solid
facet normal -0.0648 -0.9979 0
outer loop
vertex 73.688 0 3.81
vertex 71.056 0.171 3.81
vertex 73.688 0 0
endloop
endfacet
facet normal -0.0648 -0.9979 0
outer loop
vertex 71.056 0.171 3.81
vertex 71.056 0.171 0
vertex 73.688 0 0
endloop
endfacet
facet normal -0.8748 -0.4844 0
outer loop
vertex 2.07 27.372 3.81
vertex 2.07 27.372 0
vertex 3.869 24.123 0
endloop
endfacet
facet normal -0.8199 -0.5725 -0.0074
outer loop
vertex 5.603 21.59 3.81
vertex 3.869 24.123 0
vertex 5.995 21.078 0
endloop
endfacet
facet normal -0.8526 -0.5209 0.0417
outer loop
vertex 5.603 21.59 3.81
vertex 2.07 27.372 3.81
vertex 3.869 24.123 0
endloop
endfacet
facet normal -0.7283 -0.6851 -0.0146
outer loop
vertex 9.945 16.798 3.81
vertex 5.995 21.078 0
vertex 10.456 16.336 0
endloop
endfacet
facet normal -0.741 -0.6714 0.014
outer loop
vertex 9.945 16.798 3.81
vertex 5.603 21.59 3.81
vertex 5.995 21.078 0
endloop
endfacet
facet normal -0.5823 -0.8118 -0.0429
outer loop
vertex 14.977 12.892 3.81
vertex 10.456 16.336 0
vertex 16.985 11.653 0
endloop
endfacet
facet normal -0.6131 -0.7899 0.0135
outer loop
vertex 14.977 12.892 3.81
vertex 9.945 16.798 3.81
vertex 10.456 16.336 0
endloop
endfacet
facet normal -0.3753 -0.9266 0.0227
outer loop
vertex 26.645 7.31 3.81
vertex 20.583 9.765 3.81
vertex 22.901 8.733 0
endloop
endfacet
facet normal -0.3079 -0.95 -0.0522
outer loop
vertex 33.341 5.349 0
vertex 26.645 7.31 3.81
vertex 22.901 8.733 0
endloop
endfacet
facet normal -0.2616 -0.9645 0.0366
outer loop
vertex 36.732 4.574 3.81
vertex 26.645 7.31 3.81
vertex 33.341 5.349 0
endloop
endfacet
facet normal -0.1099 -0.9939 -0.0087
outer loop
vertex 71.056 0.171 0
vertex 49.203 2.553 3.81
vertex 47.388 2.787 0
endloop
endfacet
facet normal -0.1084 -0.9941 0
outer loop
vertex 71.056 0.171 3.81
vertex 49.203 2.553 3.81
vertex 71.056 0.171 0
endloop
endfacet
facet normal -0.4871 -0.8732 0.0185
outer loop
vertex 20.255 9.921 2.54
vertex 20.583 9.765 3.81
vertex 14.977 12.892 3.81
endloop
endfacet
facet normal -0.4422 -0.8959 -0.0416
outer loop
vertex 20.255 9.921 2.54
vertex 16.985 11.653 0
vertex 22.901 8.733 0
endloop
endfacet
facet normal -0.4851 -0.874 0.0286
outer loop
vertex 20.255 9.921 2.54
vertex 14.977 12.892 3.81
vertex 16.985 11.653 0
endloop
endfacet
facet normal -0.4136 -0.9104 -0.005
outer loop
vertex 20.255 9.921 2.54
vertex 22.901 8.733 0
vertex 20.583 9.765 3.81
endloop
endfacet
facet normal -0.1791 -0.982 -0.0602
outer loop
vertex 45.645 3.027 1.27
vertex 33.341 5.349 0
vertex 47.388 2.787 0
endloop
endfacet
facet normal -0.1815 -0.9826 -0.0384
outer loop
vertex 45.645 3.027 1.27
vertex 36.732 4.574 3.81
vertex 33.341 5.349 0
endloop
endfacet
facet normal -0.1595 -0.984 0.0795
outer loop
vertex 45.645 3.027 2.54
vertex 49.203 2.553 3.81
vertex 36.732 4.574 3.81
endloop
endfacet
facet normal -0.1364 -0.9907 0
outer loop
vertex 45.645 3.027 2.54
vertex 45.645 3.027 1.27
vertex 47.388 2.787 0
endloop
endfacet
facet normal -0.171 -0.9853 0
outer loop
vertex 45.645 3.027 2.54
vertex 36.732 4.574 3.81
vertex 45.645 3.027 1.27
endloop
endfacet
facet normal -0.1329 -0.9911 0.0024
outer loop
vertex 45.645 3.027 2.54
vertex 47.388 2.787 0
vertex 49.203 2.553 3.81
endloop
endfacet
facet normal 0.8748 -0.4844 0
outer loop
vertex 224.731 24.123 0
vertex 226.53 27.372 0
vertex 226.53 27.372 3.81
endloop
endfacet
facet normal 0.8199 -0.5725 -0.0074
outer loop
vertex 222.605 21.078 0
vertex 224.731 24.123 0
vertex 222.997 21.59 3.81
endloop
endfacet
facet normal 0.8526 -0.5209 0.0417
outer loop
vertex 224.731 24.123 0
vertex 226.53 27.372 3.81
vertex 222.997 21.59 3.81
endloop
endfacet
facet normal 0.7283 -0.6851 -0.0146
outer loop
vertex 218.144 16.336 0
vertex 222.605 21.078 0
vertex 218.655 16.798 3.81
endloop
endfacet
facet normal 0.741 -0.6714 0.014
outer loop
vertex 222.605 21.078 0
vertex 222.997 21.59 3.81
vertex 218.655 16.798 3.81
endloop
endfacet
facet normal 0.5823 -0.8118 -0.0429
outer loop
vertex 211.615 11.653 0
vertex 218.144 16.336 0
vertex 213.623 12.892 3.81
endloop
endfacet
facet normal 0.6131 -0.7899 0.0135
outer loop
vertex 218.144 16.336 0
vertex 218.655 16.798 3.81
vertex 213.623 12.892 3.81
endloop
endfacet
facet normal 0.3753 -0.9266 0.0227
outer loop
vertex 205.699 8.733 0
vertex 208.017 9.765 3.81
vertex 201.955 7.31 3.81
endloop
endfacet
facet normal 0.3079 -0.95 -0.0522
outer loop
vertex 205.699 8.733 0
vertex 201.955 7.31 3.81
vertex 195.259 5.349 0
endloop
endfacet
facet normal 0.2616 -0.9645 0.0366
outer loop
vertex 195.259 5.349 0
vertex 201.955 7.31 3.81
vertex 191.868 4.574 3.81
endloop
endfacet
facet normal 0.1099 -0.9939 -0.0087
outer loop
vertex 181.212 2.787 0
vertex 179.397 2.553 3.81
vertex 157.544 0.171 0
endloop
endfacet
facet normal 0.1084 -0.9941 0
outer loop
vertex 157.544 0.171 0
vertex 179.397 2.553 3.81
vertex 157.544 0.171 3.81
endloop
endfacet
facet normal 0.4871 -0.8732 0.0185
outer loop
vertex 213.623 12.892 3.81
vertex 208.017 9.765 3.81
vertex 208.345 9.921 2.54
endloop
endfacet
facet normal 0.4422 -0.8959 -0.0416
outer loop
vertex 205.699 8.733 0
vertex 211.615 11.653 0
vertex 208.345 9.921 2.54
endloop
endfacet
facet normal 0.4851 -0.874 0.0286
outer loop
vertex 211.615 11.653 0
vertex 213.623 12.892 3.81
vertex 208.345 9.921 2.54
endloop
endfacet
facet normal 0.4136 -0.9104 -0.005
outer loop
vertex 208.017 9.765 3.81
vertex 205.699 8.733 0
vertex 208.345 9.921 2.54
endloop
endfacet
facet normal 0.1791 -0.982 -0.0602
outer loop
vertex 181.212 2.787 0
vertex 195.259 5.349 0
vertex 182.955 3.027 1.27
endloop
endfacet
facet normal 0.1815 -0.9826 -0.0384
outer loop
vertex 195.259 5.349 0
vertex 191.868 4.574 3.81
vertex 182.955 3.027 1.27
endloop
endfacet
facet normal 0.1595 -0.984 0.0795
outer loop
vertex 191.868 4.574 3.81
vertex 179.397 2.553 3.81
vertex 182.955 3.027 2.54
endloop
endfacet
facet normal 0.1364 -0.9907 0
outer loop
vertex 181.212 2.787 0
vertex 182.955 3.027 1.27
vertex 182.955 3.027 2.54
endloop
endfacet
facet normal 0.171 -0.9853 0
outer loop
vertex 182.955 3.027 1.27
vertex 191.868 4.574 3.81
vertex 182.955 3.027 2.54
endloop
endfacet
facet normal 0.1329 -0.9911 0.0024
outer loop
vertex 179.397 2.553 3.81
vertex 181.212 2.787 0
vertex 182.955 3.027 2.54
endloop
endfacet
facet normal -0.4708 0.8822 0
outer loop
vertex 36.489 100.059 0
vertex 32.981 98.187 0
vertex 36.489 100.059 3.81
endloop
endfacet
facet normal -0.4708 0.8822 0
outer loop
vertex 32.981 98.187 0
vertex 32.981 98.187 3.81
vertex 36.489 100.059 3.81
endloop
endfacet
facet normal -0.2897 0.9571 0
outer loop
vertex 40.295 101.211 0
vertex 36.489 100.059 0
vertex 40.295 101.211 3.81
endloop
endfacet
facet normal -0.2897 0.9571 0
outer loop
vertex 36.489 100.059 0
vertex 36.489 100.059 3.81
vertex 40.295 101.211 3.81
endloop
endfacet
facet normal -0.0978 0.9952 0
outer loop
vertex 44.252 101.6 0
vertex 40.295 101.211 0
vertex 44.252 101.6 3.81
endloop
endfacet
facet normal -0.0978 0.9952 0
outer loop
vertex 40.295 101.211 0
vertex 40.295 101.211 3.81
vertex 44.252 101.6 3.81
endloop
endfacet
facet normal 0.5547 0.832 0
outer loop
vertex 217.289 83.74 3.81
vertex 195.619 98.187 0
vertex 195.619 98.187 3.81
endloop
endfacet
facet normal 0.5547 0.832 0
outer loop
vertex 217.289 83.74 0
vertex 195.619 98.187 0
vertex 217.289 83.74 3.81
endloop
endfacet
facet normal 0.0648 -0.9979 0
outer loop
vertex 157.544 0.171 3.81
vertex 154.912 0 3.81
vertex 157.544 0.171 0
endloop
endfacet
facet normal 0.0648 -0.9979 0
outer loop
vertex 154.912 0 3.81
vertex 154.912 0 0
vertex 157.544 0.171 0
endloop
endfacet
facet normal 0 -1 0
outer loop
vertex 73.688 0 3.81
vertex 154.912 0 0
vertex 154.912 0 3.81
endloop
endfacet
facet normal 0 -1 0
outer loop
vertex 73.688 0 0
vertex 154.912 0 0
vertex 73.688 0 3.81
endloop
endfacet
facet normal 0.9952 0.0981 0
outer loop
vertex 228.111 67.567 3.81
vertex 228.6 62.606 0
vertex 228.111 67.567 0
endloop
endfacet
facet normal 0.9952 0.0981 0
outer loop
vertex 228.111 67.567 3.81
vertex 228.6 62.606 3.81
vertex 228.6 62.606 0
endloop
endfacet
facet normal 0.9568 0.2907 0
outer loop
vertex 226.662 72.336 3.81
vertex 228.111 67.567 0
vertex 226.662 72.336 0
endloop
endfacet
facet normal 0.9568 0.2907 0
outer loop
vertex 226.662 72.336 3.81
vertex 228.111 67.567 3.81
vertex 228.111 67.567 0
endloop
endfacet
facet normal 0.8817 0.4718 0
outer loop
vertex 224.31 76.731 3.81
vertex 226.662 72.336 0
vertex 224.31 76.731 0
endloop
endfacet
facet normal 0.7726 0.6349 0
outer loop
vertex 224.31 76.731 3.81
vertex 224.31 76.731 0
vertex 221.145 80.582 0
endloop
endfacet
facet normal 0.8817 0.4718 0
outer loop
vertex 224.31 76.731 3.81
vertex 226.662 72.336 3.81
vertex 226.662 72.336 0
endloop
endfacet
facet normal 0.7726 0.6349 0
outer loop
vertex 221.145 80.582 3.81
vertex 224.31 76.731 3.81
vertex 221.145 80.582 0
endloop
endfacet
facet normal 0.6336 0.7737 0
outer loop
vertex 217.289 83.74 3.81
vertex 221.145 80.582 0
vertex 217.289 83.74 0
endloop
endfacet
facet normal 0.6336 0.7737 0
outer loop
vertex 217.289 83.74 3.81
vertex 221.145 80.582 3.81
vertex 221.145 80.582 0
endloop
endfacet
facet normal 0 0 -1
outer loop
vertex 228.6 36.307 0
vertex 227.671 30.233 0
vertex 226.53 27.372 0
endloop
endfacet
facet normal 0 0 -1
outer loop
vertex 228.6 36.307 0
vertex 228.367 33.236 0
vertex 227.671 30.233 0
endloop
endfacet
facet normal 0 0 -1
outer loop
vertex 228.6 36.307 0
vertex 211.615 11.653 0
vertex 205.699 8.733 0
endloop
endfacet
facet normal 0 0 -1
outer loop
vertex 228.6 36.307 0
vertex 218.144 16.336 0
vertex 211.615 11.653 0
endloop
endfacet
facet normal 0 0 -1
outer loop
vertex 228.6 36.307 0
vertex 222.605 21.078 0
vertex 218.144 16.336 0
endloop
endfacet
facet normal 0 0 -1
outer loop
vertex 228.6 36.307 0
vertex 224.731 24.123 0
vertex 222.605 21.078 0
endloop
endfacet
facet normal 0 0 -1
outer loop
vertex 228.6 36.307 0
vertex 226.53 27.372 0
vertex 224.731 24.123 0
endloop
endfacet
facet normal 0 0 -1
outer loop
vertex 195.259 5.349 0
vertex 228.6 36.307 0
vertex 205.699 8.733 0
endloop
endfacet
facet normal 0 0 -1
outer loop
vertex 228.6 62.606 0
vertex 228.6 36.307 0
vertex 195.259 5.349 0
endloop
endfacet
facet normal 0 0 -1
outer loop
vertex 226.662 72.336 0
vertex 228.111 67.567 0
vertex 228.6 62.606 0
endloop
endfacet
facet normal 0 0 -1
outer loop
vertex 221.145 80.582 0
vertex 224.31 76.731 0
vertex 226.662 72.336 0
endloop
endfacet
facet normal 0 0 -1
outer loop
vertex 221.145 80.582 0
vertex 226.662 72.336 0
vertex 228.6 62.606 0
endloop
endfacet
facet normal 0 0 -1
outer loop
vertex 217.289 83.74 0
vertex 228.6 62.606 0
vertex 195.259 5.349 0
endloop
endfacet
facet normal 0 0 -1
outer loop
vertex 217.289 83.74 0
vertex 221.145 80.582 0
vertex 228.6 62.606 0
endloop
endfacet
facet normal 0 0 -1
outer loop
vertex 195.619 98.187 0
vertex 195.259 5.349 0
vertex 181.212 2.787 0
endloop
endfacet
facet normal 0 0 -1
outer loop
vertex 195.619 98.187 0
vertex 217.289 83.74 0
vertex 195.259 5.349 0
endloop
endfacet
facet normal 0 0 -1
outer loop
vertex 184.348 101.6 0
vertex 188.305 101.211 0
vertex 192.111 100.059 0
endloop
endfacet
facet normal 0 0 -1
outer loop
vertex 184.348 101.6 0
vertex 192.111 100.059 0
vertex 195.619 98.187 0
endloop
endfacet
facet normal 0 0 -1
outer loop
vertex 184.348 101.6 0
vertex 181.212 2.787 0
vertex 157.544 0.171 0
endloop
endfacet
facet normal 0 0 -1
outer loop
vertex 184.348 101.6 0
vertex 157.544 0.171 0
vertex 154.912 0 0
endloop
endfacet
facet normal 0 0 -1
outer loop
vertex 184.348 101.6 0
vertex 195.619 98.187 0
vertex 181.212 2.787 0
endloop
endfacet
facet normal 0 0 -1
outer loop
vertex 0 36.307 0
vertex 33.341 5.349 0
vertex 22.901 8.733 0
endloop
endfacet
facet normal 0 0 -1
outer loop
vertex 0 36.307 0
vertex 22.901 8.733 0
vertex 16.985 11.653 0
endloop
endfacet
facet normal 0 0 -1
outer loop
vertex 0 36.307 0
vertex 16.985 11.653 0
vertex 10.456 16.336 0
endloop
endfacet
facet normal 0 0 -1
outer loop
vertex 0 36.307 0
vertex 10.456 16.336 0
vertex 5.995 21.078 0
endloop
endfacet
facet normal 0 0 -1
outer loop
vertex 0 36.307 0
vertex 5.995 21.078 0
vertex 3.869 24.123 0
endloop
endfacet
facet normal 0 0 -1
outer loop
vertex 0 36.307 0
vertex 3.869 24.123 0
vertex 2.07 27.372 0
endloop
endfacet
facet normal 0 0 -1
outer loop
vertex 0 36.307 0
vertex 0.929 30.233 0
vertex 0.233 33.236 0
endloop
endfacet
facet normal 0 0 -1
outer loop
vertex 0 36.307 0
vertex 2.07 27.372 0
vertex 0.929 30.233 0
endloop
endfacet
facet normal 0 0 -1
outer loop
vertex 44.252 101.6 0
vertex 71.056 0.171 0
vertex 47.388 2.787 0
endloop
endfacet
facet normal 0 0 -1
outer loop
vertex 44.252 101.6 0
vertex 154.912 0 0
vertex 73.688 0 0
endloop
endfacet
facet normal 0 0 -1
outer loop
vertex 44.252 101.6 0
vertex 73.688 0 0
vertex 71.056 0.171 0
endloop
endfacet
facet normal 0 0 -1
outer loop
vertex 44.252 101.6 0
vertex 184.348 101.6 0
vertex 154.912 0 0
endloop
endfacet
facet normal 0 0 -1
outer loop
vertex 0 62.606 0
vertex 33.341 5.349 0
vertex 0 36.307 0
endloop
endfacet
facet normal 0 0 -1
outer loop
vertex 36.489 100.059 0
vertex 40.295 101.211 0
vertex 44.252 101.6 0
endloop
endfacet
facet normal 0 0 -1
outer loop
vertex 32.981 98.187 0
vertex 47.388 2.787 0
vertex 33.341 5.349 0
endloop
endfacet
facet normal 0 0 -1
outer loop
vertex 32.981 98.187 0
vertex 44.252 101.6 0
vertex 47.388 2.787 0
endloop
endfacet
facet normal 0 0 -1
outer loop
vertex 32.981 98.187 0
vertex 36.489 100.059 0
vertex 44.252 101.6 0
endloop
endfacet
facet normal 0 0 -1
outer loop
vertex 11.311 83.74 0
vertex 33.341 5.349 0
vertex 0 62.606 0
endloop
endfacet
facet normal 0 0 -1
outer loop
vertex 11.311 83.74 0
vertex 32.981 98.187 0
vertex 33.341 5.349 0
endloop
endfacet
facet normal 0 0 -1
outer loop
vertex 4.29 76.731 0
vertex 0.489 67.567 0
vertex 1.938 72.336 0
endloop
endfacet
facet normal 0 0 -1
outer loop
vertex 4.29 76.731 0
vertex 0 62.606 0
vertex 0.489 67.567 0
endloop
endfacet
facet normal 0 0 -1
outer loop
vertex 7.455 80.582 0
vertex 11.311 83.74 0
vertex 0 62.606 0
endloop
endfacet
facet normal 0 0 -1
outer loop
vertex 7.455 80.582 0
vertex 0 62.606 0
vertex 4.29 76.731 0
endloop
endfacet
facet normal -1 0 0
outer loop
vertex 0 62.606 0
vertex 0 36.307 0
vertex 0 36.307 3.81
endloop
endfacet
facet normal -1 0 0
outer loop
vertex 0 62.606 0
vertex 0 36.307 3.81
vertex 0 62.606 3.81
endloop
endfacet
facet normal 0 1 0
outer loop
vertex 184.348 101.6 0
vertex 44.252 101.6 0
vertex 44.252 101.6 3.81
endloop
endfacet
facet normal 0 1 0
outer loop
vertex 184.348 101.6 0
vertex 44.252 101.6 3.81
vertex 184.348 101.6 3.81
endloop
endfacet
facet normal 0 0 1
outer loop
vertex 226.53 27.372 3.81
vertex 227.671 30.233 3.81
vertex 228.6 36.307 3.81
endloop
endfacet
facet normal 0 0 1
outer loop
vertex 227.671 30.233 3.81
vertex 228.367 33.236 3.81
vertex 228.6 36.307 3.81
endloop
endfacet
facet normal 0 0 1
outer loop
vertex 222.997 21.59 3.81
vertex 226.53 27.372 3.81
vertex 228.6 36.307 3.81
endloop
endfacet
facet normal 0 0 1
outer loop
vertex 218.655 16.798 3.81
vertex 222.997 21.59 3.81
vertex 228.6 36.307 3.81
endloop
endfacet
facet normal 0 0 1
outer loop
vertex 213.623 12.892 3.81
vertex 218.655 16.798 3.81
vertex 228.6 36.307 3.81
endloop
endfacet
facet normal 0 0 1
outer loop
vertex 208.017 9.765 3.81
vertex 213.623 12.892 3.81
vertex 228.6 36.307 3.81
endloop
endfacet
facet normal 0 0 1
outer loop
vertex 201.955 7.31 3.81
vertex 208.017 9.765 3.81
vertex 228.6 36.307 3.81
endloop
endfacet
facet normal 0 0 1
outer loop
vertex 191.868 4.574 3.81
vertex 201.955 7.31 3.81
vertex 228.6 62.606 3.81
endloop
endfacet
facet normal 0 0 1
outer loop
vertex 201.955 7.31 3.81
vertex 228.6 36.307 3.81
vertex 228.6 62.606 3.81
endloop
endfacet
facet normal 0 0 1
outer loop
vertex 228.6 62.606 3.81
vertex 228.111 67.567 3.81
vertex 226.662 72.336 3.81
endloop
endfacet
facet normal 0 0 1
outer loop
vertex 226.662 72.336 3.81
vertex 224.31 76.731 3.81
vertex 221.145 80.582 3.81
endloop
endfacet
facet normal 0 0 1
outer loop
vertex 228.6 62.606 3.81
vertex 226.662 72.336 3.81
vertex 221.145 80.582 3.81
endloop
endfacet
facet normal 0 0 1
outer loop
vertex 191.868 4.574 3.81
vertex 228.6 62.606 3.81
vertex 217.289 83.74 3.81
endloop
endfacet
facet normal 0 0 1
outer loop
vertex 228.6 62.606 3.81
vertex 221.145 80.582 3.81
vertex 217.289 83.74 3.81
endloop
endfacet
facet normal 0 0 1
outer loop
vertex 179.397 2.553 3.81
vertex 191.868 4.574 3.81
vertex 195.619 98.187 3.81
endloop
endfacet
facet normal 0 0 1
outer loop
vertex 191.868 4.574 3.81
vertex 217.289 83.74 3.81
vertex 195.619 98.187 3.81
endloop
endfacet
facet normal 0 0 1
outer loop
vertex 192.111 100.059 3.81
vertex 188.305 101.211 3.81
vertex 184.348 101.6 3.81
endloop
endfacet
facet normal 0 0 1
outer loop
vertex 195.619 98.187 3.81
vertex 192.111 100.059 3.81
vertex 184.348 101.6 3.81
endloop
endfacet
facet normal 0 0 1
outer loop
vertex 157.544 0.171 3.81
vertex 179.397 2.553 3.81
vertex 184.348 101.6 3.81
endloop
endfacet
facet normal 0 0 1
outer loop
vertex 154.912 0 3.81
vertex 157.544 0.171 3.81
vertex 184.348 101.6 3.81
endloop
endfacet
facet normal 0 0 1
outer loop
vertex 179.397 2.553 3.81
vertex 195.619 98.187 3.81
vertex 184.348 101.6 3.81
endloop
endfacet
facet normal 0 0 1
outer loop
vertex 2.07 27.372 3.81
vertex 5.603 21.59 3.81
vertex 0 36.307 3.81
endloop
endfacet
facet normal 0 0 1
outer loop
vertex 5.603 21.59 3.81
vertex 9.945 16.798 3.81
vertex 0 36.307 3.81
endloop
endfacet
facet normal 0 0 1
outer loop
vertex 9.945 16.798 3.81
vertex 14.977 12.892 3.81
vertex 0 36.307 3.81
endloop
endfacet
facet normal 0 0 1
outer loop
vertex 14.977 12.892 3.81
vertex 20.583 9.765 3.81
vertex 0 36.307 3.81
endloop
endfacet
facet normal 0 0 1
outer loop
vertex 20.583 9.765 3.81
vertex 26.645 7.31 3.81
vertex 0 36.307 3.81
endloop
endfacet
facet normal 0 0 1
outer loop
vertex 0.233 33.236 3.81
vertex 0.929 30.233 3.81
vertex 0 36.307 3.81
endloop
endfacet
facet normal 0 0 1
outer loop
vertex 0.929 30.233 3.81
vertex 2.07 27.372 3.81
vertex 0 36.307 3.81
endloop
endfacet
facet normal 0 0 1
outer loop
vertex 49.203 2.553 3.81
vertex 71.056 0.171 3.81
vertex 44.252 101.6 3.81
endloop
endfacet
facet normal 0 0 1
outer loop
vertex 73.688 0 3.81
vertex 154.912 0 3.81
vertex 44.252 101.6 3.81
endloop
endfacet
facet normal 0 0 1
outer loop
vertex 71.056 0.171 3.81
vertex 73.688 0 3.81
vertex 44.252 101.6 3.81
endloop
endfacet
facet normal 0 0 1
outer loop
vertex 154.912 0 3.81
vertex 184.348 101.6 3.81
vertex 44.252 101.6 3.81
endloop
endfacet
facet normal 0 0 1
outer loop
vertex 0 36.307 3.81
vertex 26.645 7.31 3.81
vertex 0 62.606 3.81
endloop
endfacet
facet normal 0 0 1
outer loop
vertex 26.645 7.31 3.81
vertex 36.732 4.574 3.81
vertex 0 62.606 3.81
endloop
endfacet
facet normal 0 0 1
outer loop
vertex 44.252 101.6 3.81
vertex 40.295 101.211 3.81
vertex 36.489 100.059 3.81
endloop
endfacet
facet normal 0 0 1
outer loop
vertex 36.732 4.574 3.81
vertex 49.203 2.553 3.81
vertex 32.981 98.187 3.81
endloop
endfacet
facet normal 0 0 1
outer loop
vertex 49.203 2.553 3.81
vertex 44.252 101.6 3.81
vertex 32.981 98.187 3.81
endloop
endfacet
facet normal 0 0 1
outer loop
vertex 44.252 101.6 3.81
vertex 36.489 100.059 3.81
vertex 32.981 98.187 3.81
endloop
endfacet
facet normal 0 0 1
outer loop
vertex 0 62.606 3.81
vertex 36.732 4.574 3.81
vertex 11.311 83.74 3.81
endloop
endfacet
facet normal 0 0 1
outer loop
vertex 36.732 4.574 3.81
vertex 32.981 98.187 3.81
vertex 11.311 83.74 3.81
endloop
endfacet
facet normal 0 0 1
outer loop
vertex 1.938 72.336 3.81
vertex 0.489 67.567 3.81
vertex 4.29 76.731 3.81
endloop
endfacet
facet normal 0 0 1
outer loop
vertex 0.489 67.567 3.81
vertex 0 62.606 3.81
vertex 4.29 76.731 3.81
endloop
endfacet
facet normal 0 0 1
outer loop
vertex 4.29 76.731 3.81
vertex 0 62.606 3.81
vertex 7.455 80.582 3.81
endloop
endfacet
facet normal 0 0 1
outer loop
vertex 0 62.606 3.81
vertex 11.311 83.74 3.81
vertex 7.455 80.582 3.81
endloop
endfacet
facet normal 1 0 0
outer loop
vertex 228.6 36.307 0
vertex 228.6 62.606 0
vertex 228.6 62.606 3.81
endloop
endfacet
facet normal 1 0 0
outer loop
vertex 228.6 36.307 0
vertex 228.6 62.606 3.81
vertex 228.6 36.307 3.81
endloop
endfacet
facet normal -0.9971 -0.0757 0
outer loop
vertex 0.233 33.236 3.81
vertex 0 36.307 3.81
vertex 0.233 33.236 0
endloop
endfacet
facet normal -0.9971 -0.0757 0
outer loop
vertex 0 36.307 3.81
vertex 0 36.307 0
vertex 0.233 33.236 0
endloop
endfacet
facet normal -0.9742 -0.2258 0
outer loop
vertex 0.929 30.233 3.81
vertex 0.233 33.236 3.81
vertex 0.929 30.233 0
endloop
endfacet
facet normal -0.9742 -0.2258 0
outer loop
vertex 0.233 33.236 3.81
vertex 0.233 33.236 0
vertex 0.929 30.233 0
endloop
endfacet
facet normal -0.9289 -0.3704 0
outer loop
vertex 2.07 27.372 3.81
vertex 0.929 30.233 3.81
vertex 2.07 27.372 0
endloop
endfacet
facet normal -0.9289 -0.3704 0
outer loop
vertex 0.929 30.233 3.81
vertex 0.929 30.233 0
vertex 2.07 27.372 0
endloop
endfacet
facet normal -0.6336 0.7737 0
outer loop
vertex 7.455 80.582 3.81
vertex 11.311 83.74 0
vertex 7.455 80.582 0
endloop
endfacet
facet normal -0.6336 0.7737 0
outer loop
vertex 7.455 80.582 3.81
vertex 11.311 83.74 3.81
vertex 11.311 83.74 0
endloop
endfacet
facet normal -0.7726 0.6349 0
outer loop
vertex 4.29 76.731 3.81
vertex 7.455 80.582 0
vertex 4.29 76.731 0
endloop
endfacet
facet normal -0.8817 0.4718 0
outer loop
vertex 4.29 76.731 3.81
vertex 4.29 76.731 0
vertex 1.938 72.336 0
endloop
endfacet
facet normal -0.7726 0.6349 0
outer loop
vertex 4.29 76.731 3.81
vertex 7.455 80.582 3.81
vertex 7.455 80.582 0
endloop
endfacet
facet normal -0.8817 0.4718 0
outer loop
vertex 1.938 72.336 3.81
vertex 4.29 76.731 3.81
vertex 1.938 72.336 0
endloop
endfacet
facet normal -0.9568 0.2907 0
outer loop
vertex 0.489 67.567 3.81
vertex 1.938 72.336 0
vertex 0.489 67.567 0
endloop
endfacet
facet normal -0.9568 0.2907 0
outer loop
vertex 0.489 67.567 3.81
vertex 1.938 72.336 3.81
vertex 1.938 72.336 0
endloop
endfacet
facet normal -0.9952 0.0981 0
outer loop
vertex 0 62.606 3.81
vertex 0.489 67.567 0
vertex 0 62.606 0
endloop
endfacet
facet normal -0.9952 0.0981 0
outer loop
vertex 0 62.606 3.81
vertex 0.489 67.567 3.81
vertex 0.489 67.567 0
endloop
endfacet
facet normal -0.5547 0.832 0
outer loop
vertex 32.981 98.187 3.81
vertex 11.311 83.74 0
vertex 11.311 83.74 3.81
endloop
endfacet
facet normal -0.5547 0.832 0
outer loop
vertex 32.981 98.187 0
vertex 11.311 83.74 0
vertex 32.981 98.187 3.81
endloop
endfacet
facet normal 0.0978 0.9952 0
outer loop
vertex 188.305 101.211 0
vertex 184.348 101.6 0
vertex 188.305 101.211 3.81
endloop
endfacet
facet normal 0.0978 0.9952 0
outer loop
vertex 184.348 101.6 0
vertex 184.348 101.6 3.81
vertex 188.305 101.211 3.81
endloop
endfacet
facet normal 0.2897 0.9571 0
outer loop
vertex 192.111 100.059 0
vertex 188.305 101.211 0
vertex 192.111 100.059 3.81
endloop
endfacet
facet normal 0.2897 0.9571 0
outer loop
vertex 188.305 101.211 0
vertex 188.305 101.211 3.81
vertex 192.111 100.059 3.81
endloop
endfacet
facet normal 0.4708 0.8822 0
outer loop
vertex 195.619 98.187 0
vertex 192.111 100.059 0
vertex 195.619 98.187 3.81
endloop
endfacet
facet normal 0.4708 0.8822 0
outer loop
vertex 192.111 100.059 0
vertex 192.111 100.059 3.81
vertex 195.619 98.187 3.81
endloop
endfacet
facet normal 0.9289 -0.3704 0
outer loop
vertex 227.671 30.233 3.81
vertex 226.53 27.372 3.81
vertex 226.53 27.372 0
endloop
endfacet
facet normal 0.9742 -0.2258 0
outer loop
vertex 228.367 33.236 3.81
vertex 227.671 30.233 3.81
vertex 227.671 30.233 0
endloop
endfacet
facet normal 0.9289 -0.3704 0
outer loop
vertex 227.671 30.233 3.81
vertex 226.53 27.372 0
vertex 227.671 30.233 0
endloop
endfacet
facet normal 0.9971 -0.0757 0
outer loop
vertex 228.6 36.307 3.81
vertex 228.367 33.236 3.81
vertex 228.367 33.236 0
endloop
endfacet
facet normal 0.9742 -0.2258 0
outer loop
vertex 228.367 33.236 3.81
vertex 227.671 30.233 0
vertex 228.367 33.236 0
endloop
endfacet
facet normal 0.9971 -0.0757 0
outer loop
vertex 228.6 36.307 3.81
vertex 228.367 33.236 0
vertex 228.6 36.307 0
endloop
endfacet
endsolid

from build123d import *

# Parameters (mm, degrees)
BOSS_EXTRUDE1_DEPTH = 3.81
FILLET1_R           = 20.32
FILLET3_R           = 25.4
CUT_EXTRUDE8_DEPTH  = 251.19
FILLET4_R           = 20.32
FILLET5_R           = 20.32


with BuildPart() as part:
    # Sketch1 → Boss-Extrude1 (new body)
    with BuildSketch(Plane.XY):
        Polygon((0, 76.2), (38.1, 101.6), (190.5, 101.6), (228.6, 76.2), (228.6, 0), (0, 0), align=None)
    extrude(amount=BOSS_EXTRUDE1_DEPTH)

    # Fillet1
    fillet1_edges = [part.edges().sort_by_distance(p)[0] for p in [
        (190.5, 101.6, 1.905),
        (38.1, 101.6, 1.905),
    ]]
    fillet(fillet1_edges, radius=FILLET1_R)

    # Fillet3
    fillet3_edges = [part.edges().sort_by_distance(p)[0] for p in [
        (0, 76.2, 1.905),
        (228.6, 76.2, 1.905),
    ]]
    fillet(fillet3_edges, radius=FILLET3_R)

    # Sketch2 → Cut-Extrude8 (cut, through all)
    with BuildSketch(Plane.XY.offset(3.81)):
        with BuildLine():
            Line((72.324780666, 0), (0, 0))
            Line((0, 0), (0, 32.483690967))
            add(Edge.make_bspline(
                [(0, 32.483690967), (10.059478489, 1.840398762), (47.836090043, 3.417036799), (72.324780666, 0)],
                knots=[0, 0, 0, 0, 1, 1, 1, 1], degree=3))
        make_face()
        with BuildLine():
            Line((156.275219334, 0), (228.6, 0))
            Line((228.6, 0), (228.6, 32.483690967))
            add(Edge.make_bspline(
                [(228.6, 32.483690967), (218.540521511, 1.840398762), (180.763909957, 3.417036799), (156.275219334, 0)],
                knots=[0, 0, 0, 0, 1, 1, 1, 1], degree=3))
        make_face()
    extrude(amount=-CUT_EXTRUDE8_DEPTH, mode=Mode.SUBTRACT)

    # Fillet4
    fillet4_edges = [part.edges().sort_by_distance(p)[0] for p in [
        (0, 32.483690967, 1.905),
        (228.6, 32.483690967, 1.905),
    ]]
    fillet(fillet4_edges, radius=FILLET4_R)

    # Fillet5
    fillet5_edges = [part.edges().sort_by_distance(p)[0] for p in [
        (72.324780666, 0, 1.905),
        (156.275219334, 0, 1.905),
    ]]
    fillet(fillet5_edges, radius=FILLET5_R)


solid = part.part
